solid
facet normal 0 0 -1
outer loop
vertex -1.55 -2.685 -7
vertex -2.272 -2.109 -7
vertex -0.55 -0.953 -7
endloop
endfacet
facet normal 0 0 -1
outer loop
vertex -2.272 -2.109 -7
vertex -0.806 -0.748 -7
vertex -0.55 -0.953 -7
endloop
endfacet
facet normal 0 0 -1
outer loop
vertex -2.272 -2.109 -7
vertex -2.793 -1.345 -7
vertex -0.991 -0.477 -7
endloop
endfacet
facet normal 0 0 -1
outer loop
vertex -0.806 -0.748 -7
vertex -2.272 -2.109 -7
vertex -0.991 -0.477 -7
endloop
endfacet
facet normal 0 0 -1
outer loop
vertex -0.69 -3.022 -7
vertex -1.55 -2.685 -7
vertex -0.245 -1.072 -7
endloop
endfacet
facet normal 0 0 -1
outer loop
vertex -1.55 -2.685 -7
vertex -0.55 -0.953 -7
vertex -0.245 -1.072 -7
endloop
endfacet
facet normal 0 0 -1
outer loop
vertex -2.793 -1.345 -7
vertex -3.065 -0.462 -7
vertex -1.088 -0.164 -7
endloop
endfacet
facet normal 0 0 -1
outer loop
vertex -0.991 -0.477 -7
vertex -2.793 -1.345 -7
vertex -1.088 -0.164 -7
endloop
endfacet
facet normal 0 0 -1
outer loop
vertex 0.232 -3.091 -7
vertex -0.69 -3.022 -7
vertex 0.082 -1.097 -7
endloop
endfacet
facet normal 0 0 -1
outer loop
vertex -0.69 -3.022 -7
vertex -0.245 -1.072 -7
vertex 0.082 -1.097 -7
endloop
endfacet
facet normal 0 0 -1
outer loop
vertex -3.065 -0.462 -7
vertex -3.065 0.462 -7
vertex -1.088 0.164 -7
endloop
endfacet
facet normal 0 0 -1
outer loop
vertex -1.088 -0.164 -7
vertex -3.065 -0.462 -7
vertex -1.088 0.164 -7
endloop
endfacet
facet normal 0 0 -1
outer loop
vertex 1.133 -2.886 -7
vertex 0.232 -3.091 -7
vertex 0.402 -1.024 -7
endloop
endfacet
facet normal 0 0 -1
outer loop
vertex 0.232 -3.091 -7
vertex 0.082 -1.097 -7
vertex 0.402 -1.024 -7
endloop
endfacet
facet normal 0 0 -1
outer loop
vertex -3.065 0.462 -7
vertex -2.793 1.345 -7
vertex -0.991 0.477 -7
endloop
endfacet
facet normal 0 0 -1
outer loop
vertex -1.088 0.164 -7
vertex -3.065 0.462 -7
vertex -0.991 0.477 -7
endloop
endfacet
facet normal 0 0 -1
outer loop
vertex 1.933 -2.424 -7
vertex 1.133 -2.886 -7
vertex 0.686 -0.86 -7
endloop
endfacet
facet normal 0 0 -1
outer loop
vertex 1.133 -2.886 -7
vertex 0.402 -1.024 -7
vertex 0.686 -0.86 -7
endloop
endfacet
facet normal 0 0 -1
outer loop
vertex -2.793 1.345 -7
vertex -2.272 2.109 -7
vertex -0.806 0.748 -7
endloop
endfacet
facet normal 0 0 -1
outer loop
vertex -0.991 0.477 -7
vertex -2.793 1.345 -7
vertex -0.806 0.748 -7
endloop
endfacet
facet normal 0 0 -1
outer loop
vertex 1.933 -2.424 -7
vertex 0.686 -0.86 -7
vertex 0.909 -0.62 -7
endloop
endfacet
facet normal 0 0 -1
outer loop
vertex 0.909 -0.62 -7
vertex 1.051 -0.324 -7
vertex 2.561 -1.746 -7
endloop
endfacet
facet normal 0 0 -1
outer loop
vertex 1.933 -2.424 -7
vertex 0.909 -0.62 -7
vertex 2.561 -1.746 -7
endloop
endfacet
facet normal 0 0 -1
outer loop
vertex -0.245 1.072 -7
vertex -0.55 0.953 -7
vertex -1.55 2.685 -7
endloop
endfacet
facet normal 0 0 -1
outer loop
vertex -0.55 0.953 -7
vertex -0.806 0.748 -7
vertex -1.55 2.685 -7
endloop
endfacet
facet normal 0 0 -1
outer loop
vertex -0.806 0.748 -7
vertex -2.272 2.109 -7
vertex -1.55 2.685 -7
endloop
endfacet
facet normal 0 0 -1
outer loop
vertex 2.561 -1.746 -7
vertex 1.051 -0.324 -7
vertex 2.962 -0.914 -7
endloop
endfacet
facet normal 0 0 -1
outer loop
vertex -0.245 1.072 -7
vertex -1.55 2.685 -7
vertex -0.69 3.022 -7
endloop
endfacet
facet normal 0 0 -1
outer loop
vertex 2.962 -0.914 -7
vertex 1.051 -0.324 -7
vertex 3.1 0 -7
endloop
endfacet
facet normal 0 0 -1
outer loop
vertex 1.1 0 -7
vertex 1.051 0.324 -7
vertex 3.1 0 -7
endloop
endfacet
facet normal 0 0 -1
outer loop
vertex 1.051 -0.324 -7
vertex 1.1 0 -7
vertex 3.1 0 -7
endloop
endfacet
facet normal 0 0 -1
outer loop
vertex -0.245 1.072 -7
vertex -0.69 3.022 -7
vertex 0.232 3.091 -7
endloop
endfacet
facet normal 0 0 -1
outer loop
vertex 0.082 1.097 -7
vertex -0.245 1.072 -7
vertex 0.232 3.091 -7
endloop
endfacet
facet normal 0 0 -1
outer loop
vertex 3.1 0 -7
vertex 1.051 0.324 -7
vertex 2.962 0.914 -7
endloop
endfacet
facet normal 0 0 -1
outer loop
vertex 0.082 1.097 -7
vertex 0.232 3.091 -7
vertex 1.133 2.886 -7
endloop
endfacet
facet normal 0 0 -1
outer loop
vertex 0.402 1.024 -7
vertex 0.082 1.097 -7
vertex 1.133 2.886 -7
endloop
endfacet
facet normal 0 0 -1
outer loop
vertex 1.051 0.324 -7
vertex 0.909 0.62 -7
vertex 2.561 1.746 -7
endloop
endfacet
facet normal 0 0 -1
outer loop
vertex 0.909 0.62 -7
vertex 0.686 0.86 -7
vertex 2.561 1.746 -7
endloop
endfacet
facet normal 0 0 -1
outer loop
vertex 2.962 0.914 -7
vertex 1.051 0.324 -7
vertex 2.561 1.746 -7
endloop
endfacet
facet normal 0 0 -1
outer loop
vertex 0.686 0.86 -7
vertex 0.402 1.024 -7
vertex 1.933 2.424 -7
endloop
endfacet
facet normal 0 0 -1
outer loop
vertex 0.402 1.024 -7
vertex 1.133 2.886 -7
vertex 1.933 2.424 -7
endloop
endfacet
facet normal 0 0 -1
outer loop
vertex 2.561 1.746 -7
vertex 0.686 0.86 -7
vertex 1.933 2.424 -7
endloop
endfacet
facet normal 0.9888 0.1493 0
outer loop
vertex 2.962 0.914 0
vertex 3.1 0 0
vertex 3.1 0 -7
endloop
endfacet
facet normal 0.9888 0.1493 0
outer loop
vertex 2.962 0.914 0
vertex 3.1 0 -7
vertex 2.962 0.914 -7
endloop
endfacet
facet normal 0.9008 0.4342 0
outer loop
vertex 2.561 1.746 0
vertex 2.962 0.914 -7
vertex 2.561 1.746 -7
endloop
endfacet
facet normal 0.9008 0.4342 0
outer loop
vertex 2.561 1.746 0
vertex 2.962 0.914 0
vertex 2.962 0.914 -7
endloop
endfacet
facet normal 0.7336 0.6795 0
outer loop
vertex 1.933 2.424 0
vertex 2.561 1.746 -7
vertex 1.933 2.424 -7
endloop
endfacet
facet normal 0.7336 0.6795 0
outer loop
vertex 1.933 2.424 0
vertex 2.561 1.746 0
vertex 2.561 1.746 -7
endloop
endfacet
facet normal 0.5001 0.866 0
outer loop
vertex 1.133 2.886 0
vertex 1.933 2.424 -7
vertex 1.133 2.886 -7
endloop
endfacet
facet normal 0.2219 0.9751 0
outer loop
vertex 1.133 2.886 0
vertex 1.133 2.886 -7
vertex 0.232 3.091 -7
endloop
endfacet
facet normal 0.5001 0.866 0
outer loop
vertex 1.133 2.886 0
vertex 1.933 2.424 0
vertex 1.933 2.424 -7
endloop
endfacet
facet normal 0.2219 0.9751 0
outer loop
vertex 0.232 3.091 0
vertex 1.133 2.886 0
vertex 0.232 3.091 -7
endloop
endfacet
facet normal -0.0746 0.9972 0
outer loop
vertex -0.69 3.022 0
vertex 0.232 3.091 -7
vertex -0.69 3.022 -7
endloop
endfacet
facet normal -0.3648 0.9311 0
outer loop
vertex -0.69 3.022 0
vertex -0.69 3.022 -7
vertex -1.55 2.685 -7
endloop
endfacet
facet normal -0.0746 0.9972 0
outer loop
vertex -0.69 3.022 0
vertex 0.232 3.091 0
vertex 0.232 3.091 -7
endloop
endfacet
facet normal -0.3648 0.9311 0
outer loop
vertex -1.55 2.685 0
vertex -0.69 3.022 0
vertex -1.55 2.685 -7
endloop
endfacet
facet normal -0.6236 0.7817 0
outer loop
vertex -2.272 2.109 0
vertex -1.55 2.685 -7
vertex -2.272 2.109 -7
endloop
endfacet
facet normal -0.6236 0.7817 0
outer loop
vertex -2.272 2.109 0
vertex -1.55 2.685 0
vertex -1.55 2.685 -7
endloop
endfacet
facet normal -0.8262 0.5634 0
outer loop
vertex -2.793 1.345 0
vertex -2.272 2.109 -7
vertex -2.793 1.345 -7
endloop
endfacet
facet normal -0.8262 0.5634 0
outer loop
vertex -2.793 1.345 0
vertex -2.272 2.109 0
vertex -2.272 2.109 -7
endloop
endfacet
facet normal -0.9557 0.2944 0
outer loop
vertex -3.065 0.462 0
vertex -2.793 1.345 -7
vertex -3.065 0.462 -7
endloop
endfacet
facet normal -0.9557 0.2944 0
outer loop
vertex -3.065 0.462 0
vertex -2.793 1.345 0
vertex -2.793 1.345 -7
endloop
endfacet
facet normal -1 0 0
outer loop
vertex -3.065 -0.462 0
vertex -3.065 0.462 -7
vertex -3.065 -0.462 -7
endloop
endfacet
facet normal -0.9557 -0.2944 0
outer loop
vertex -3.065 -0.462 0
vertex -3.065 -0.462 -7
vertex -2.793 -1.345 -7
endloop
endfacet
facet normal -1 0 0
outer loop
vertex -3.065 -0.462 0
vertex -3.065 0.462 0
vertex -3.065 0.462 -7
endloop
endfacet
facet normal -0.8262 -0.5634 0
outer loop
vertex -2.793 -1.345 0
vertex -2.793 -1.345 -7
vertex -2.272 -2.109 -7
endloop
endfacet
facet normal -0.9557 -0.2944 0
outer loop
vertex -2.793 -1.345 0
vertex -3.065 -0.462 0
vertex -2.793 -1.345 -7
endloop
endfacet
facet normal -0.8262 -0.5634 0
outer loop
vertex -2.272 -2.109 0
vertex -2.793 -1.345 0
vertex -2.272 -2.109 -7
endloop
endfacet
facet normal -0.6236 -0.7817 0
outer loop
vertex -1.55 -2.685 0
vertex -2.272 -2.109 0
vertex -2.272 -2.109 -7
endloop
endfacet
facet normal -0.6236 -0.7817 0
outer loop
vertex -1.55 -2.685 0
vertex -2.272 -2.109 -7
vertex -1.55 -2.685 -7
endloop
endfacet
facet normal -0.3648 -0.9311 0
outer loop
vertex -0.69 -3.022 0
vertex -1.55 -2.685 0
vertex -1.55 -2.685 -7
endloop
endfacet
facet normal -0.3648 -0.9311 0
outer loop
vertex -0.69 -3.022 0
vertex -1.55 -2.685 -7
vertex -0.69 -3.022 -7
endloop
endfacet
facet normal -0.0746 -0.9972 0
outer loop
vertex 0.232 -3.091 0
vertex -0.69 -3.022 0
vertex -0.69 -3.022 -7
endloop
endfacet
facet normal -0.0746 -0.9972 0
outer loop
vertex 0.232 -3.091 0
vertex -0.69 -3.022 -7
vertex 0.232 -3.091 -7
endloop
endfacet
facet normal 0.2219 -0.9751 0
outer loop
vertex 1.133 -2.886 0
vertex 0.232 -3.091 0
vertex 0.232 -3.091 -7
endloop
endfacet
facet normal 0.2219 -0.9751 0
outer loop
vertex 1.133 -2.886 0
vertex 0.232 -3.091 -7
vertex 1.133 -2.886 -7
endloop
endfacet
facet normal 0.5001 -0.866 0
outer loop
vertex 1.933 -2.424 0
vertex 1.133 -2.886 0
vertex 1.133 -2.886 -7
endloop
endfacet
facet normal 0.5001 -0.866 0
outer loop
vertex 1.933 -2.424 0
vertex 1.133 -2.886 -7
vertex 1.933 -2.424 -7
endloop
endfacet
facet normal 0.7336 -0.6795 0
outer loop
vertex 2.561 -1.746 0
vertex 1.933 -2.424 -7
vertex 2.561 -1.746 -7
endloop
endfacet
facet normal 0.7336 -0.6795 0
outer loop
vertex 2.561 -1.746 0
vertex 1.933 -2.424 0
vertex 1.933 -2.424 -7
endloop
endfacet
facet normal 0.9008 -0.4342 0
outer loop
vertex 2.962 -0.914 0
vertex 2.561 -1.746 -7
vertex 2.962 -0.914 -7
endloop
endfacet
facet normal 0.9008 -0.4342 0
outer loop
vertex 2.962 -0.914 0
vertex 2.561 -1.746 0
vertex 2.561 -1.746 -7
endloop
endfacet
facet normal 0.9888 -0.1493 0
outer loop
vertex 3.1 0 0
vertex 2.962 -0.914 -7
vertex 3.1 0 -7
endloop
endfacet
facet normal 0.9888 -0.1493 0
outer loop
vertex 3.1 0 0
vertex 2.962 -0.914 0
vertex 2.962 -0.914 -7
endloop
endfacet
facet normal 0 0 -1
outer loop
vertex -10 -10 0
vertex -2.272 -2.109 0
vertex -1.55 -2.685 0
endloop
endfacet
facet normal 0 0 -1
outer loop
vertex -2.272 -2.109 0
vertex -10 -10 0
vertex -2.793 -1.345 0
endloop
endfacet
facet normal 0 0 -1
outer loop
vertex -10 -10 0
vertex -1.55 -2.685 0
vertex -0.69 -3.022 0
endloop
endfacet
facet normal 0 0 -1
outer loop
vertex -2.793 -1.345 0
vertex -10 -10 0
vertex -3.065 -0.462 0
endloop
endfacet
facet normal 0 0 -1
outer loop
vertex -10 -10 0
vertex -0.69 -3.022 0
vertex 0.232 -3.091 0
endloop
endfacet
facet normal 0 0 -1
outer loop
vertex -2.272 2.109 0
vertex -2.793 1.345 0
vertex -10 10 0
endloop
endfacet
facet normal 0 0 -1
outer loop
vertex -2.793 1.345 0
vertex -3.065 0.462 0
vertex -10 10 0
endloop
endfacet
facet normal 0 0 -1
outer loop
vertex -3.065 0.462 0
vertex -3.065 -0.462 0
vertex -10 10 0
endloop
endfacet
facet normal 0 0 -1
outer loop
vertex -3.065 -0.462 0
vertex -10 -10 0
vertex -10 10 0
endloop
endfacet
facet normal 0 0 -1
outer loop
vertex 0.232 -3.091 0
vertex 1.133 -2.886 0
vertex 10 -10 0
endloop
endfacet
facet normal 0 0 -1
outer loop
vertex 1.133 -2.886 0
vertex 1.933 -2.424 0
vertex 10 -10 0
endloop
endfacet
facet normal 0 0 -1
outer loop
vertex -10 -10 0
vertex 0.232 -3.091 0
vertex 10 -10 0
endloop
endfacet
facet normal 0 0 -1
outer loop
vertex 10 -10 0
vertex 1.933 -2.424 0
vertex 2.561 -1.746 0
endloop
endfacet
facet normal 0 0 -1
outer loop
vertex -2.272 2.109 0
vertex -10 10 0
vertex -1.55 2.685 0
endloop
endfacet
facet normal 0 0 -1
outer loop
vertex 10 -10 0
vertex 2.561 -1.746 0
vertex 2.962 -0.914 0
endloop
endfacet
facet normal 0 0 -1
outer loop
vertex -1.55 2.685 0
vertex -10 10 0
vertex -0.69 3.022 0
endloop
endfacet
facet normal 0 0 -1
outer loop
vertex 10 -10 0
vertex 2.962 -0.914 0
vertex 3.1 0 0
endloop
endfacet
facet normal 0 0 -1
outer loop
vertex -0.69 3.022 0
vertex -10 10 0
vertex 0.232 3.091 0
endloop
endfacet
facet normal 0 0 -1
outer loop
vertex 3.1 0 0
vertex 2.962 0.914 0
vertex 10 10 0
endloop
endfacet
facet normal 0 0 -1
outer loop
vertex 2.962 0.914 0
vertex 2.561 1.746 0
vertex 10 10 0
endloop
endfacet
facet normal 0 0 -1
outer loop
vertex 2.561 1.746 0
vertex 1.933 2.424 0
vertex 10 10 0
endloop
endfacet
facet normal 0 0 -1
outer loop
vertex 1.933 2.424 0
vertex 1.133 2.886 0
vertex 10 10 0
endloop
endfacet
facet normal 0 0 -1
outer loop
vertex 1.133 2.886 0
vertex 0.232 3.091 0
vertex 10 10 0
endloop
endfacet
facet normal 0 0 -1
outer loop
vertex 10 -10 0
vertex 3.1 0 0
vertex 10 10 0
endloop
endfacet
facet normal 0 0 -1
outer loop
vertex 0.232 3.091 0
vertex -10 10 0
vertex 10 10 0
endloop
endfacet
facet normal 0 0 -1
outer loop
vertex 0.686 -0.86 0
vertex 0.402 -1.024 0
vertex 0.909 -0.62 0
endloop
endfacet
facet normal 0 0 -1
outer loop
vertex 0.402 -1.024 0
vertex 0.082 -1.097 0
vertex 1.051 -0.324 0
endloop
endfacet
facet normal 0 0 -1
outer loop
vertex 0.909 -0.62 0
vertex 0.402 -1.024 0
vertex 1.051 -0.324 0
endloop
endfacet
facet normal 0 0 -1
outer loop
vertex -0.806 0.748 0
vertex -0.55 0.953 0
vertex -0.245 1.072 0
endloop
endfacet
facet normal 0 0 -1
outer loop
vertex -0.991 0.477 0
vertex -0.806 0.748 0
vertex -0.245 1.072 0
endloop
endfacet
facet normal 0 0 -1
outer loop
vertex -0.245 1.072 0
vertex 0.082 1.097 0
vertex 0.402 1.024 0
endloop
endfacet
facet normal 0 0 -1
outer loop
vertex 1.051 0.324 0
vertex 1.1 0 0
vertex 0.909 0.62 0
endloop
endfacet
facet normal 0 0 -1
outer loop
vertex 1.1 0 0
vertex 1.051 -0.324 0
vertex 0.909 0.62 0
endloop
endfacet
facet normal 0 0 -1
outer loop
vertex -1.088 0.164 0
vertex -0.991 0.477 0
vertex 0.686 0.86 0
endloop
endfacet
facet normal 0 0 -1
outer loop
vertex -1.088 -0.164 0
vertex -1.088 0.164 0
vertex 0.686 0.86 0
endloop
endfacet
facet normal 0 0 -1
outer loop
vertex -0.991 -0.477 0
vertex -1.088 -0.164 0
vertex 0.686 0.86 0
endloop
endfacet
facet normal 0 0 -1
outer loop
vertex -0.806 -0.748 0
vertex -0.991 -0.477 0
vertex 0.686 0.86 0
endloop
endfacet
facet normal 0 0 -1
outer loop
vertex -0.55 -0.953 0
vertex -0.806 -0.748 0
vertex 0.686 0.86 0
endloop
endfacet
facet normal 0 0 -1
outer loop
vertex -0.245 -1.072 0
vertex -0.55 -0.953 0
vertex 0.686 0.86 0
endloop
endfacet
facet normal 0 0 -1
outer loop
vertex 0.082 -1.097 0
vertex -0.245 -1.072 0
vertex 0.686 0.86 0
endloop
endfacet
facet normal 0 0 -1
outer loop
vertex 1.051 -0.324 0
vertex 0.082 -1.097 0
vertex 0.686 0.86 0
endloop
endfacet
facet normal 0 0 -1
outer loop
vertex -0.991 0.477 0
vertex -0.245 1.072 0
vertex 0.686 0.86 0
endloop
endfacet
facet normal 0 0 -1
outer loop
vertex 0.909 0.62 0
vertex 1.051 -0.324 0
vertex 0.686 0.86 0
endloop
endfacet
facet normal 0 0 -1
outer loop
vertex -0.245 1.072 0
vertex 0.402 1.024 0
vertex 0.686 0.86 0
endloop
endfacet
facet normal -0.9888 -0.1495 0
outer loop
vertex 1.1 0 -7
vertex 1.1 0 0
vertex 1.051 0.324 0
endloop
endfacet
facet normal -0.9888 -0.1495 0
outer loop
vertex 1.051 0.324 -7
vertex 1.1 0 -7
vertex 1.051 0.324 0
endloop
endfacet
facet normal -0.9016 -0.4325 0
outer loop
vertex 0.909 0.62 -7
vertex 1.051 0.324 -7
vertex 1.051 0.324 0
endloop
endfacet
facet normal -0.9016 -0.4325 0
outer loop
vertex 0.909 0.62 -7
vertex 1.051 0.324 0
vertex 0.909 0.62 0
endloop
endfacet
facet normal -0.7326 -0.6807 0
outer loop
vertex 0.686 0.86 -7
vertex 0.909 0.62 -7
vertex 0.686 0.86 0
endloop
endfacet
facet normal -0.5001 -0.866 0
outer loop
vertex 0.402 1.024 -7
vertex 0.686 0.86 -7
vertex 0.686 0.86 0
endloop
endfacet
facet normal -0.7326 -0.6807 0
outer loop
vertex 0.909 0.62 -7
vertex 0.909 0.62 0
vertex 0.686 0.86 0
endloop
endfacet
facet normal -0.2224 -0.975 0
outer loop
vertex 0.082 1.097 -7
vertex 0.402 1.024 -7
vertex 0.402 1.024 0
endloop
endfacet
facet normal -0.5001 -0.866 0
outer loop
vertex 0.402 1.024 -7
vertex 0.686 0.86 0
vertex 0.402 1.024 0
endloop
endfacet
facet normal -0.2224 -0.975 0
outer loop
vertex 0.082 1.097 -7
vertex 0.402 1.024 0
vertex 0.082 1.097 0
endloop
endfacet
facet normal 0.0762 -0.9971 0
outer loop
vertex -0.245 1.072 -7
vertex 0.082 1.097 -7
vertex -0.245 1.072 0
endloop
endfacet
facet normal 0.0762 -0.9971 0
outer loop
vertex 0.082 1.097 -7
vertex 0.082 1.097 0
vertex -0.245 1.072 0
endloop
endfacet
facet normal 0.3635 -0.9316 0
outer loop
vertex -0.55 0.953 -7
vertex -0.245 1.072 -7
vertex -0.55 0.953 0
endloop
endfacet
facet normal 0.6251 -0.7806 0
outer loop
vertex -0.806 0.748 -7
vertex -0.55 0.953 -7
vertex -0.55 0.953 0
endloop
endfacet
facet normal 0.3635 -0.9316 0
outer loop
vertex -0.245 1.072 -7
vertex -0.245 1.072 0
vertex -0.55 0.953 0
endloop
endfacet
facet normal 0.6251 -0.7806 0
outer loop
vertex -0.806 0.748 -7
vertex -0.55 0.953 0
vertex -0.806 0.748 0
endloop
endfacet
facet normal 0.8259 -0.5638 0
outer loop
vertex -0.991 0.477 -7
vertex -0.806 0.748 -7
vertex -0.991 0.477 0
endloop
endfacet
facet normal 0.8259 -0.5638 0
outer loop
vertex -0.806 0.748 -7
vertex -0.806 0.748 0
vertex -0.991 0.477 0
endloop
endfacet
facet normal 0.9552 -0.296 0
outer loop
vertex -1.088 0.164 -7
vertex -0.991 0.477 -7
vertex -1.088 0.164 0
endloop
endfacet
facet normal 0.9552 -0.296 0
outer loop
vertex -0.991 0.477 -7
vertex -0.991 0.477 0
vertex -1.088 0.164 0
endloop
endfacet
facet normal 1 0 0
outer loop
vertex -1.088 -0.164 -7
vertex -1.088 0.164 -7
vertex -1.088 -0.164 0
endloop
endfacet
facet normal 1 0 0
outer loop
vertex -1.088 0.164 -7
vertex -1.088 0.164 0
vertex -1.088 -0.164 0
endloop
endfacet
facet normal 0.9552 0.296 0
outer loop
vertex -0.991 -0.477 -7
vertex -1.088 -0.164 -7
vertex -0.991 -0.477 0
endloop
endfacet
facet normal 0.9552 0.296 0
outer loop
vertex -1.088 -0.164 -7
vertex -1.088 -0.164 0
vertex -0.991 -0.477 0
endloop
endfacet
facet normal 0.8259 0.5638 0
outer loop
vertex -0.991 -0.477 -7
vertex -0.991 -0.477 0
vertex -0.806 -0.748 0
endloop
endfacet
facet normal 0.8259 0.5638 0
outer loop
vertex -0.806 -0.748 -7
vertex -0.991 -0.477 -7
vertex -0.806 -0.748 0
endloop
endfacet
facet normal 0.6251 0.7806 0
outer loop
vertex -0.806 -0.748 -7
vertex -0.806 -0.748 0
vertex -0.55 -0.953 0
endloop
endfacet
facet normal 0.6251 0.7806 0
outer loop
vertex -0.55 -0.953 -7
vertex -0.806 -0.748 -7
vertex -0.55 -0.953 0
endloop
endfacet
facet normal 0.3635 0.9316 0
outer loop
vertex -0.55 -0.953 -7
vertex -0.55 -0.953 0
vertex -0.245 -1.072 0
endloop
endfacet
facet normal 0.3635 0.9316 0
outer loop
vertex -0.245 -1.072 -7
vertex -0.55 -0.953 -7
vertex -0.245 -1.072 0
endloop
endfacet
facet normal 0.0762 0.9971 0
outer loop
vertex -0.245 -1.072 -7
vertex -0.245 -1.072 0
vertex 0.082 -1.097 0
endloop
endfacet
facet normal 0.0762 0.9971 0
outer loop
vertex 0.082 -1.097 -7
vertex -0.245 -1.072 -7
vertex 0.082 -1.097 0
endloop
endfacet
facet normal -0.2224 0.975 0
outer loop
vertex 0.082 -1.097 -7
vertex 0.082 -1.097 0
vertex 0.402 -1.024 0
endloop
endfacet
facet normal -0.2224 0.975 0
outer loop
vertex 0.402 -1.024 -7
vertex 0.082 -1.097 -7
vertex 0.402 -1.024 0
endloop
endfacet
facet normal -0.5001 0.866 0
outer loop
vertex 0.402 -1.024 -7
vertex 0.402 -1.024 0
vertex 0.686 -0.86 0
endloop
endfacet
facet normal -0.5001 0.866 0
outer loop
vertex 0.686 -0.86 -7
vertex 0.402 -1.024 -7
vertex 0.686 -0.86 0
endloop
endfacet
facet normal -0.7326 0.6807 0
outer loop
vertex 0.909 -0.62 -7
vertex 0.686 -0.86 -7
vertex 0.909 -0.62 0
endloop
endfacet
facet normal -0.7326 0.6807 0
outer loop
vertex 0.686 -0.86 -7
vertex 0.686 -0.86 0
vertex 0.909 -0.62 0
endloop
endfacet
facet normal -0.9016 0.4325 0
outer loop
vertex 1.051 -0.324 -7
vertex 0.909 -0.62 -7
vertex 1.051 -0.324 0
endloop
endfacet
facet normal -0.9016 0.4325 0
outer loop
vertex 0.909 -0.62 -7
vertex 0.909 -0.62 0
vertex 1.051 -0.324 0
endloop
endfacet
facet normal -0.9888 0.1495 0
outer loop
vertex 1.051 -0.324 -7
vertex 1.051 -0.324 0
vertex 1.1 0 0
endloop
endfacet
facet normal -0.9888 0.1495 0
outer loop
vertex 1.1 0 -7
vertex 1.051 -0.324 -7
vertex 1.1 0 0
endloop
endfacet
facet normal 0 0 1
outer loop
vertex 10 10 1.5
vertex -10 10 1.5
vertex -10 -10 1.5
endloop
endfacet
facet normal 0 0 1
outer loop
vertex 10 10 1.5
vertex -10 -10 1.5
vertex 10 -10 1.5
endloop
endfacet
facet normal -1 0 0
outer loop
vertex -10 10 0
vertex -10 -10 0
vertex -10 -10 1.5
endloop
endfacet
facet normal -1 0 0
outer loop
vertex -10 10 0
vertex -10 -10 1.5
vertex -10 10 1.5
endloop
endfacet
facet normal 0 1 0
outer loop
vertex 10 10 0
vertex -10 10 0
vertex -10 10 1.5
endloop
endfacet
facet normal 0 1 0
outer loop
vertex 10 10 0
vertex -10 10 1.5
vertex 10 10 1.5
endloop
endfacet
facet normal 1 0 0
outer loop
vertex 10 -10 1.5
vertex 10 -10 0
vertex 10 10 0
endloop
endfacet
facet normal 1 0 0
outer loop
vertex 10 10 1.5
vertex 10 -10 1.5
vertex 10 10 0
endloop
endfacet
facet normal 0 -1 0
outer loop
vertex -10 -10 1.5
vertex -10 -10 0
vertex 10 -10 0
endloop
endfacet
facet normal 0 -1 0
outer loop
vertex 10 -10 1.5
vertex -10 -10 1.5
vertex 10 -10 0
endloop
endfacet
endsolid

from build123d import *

# Parameters (mm, degrees)
SKETCH_2_W        = 20
SKETCH_2_H        = 20
EXTRUDE_348_DEPTH = 1.5
SKETCH_3_R        = 3.1
SKETCH_3_R_2      = 1.1
EXTRUDE_476_DEPTH = 7


with BuildPart() as part:
    # Эскиз2 → Extrude 348 (new body)
    with BuildSketch(Plane.XY):
        Rectangle(SKETCH_2_W, SKETCH_2_H)
    extrude(amount=EXTRUDE_348_DEPTH)

    # Эскиз3 → Extrude 476 (add)
    with BuildSketch(Plane.XY):
        Circle(SKETCH_3_R)
        Circle(SKETCH_3_R_2, mode=Mode.SUBTRACT)
    extrude(amount=-EXTRUDE_476_DEPTH)


solid = part.part
